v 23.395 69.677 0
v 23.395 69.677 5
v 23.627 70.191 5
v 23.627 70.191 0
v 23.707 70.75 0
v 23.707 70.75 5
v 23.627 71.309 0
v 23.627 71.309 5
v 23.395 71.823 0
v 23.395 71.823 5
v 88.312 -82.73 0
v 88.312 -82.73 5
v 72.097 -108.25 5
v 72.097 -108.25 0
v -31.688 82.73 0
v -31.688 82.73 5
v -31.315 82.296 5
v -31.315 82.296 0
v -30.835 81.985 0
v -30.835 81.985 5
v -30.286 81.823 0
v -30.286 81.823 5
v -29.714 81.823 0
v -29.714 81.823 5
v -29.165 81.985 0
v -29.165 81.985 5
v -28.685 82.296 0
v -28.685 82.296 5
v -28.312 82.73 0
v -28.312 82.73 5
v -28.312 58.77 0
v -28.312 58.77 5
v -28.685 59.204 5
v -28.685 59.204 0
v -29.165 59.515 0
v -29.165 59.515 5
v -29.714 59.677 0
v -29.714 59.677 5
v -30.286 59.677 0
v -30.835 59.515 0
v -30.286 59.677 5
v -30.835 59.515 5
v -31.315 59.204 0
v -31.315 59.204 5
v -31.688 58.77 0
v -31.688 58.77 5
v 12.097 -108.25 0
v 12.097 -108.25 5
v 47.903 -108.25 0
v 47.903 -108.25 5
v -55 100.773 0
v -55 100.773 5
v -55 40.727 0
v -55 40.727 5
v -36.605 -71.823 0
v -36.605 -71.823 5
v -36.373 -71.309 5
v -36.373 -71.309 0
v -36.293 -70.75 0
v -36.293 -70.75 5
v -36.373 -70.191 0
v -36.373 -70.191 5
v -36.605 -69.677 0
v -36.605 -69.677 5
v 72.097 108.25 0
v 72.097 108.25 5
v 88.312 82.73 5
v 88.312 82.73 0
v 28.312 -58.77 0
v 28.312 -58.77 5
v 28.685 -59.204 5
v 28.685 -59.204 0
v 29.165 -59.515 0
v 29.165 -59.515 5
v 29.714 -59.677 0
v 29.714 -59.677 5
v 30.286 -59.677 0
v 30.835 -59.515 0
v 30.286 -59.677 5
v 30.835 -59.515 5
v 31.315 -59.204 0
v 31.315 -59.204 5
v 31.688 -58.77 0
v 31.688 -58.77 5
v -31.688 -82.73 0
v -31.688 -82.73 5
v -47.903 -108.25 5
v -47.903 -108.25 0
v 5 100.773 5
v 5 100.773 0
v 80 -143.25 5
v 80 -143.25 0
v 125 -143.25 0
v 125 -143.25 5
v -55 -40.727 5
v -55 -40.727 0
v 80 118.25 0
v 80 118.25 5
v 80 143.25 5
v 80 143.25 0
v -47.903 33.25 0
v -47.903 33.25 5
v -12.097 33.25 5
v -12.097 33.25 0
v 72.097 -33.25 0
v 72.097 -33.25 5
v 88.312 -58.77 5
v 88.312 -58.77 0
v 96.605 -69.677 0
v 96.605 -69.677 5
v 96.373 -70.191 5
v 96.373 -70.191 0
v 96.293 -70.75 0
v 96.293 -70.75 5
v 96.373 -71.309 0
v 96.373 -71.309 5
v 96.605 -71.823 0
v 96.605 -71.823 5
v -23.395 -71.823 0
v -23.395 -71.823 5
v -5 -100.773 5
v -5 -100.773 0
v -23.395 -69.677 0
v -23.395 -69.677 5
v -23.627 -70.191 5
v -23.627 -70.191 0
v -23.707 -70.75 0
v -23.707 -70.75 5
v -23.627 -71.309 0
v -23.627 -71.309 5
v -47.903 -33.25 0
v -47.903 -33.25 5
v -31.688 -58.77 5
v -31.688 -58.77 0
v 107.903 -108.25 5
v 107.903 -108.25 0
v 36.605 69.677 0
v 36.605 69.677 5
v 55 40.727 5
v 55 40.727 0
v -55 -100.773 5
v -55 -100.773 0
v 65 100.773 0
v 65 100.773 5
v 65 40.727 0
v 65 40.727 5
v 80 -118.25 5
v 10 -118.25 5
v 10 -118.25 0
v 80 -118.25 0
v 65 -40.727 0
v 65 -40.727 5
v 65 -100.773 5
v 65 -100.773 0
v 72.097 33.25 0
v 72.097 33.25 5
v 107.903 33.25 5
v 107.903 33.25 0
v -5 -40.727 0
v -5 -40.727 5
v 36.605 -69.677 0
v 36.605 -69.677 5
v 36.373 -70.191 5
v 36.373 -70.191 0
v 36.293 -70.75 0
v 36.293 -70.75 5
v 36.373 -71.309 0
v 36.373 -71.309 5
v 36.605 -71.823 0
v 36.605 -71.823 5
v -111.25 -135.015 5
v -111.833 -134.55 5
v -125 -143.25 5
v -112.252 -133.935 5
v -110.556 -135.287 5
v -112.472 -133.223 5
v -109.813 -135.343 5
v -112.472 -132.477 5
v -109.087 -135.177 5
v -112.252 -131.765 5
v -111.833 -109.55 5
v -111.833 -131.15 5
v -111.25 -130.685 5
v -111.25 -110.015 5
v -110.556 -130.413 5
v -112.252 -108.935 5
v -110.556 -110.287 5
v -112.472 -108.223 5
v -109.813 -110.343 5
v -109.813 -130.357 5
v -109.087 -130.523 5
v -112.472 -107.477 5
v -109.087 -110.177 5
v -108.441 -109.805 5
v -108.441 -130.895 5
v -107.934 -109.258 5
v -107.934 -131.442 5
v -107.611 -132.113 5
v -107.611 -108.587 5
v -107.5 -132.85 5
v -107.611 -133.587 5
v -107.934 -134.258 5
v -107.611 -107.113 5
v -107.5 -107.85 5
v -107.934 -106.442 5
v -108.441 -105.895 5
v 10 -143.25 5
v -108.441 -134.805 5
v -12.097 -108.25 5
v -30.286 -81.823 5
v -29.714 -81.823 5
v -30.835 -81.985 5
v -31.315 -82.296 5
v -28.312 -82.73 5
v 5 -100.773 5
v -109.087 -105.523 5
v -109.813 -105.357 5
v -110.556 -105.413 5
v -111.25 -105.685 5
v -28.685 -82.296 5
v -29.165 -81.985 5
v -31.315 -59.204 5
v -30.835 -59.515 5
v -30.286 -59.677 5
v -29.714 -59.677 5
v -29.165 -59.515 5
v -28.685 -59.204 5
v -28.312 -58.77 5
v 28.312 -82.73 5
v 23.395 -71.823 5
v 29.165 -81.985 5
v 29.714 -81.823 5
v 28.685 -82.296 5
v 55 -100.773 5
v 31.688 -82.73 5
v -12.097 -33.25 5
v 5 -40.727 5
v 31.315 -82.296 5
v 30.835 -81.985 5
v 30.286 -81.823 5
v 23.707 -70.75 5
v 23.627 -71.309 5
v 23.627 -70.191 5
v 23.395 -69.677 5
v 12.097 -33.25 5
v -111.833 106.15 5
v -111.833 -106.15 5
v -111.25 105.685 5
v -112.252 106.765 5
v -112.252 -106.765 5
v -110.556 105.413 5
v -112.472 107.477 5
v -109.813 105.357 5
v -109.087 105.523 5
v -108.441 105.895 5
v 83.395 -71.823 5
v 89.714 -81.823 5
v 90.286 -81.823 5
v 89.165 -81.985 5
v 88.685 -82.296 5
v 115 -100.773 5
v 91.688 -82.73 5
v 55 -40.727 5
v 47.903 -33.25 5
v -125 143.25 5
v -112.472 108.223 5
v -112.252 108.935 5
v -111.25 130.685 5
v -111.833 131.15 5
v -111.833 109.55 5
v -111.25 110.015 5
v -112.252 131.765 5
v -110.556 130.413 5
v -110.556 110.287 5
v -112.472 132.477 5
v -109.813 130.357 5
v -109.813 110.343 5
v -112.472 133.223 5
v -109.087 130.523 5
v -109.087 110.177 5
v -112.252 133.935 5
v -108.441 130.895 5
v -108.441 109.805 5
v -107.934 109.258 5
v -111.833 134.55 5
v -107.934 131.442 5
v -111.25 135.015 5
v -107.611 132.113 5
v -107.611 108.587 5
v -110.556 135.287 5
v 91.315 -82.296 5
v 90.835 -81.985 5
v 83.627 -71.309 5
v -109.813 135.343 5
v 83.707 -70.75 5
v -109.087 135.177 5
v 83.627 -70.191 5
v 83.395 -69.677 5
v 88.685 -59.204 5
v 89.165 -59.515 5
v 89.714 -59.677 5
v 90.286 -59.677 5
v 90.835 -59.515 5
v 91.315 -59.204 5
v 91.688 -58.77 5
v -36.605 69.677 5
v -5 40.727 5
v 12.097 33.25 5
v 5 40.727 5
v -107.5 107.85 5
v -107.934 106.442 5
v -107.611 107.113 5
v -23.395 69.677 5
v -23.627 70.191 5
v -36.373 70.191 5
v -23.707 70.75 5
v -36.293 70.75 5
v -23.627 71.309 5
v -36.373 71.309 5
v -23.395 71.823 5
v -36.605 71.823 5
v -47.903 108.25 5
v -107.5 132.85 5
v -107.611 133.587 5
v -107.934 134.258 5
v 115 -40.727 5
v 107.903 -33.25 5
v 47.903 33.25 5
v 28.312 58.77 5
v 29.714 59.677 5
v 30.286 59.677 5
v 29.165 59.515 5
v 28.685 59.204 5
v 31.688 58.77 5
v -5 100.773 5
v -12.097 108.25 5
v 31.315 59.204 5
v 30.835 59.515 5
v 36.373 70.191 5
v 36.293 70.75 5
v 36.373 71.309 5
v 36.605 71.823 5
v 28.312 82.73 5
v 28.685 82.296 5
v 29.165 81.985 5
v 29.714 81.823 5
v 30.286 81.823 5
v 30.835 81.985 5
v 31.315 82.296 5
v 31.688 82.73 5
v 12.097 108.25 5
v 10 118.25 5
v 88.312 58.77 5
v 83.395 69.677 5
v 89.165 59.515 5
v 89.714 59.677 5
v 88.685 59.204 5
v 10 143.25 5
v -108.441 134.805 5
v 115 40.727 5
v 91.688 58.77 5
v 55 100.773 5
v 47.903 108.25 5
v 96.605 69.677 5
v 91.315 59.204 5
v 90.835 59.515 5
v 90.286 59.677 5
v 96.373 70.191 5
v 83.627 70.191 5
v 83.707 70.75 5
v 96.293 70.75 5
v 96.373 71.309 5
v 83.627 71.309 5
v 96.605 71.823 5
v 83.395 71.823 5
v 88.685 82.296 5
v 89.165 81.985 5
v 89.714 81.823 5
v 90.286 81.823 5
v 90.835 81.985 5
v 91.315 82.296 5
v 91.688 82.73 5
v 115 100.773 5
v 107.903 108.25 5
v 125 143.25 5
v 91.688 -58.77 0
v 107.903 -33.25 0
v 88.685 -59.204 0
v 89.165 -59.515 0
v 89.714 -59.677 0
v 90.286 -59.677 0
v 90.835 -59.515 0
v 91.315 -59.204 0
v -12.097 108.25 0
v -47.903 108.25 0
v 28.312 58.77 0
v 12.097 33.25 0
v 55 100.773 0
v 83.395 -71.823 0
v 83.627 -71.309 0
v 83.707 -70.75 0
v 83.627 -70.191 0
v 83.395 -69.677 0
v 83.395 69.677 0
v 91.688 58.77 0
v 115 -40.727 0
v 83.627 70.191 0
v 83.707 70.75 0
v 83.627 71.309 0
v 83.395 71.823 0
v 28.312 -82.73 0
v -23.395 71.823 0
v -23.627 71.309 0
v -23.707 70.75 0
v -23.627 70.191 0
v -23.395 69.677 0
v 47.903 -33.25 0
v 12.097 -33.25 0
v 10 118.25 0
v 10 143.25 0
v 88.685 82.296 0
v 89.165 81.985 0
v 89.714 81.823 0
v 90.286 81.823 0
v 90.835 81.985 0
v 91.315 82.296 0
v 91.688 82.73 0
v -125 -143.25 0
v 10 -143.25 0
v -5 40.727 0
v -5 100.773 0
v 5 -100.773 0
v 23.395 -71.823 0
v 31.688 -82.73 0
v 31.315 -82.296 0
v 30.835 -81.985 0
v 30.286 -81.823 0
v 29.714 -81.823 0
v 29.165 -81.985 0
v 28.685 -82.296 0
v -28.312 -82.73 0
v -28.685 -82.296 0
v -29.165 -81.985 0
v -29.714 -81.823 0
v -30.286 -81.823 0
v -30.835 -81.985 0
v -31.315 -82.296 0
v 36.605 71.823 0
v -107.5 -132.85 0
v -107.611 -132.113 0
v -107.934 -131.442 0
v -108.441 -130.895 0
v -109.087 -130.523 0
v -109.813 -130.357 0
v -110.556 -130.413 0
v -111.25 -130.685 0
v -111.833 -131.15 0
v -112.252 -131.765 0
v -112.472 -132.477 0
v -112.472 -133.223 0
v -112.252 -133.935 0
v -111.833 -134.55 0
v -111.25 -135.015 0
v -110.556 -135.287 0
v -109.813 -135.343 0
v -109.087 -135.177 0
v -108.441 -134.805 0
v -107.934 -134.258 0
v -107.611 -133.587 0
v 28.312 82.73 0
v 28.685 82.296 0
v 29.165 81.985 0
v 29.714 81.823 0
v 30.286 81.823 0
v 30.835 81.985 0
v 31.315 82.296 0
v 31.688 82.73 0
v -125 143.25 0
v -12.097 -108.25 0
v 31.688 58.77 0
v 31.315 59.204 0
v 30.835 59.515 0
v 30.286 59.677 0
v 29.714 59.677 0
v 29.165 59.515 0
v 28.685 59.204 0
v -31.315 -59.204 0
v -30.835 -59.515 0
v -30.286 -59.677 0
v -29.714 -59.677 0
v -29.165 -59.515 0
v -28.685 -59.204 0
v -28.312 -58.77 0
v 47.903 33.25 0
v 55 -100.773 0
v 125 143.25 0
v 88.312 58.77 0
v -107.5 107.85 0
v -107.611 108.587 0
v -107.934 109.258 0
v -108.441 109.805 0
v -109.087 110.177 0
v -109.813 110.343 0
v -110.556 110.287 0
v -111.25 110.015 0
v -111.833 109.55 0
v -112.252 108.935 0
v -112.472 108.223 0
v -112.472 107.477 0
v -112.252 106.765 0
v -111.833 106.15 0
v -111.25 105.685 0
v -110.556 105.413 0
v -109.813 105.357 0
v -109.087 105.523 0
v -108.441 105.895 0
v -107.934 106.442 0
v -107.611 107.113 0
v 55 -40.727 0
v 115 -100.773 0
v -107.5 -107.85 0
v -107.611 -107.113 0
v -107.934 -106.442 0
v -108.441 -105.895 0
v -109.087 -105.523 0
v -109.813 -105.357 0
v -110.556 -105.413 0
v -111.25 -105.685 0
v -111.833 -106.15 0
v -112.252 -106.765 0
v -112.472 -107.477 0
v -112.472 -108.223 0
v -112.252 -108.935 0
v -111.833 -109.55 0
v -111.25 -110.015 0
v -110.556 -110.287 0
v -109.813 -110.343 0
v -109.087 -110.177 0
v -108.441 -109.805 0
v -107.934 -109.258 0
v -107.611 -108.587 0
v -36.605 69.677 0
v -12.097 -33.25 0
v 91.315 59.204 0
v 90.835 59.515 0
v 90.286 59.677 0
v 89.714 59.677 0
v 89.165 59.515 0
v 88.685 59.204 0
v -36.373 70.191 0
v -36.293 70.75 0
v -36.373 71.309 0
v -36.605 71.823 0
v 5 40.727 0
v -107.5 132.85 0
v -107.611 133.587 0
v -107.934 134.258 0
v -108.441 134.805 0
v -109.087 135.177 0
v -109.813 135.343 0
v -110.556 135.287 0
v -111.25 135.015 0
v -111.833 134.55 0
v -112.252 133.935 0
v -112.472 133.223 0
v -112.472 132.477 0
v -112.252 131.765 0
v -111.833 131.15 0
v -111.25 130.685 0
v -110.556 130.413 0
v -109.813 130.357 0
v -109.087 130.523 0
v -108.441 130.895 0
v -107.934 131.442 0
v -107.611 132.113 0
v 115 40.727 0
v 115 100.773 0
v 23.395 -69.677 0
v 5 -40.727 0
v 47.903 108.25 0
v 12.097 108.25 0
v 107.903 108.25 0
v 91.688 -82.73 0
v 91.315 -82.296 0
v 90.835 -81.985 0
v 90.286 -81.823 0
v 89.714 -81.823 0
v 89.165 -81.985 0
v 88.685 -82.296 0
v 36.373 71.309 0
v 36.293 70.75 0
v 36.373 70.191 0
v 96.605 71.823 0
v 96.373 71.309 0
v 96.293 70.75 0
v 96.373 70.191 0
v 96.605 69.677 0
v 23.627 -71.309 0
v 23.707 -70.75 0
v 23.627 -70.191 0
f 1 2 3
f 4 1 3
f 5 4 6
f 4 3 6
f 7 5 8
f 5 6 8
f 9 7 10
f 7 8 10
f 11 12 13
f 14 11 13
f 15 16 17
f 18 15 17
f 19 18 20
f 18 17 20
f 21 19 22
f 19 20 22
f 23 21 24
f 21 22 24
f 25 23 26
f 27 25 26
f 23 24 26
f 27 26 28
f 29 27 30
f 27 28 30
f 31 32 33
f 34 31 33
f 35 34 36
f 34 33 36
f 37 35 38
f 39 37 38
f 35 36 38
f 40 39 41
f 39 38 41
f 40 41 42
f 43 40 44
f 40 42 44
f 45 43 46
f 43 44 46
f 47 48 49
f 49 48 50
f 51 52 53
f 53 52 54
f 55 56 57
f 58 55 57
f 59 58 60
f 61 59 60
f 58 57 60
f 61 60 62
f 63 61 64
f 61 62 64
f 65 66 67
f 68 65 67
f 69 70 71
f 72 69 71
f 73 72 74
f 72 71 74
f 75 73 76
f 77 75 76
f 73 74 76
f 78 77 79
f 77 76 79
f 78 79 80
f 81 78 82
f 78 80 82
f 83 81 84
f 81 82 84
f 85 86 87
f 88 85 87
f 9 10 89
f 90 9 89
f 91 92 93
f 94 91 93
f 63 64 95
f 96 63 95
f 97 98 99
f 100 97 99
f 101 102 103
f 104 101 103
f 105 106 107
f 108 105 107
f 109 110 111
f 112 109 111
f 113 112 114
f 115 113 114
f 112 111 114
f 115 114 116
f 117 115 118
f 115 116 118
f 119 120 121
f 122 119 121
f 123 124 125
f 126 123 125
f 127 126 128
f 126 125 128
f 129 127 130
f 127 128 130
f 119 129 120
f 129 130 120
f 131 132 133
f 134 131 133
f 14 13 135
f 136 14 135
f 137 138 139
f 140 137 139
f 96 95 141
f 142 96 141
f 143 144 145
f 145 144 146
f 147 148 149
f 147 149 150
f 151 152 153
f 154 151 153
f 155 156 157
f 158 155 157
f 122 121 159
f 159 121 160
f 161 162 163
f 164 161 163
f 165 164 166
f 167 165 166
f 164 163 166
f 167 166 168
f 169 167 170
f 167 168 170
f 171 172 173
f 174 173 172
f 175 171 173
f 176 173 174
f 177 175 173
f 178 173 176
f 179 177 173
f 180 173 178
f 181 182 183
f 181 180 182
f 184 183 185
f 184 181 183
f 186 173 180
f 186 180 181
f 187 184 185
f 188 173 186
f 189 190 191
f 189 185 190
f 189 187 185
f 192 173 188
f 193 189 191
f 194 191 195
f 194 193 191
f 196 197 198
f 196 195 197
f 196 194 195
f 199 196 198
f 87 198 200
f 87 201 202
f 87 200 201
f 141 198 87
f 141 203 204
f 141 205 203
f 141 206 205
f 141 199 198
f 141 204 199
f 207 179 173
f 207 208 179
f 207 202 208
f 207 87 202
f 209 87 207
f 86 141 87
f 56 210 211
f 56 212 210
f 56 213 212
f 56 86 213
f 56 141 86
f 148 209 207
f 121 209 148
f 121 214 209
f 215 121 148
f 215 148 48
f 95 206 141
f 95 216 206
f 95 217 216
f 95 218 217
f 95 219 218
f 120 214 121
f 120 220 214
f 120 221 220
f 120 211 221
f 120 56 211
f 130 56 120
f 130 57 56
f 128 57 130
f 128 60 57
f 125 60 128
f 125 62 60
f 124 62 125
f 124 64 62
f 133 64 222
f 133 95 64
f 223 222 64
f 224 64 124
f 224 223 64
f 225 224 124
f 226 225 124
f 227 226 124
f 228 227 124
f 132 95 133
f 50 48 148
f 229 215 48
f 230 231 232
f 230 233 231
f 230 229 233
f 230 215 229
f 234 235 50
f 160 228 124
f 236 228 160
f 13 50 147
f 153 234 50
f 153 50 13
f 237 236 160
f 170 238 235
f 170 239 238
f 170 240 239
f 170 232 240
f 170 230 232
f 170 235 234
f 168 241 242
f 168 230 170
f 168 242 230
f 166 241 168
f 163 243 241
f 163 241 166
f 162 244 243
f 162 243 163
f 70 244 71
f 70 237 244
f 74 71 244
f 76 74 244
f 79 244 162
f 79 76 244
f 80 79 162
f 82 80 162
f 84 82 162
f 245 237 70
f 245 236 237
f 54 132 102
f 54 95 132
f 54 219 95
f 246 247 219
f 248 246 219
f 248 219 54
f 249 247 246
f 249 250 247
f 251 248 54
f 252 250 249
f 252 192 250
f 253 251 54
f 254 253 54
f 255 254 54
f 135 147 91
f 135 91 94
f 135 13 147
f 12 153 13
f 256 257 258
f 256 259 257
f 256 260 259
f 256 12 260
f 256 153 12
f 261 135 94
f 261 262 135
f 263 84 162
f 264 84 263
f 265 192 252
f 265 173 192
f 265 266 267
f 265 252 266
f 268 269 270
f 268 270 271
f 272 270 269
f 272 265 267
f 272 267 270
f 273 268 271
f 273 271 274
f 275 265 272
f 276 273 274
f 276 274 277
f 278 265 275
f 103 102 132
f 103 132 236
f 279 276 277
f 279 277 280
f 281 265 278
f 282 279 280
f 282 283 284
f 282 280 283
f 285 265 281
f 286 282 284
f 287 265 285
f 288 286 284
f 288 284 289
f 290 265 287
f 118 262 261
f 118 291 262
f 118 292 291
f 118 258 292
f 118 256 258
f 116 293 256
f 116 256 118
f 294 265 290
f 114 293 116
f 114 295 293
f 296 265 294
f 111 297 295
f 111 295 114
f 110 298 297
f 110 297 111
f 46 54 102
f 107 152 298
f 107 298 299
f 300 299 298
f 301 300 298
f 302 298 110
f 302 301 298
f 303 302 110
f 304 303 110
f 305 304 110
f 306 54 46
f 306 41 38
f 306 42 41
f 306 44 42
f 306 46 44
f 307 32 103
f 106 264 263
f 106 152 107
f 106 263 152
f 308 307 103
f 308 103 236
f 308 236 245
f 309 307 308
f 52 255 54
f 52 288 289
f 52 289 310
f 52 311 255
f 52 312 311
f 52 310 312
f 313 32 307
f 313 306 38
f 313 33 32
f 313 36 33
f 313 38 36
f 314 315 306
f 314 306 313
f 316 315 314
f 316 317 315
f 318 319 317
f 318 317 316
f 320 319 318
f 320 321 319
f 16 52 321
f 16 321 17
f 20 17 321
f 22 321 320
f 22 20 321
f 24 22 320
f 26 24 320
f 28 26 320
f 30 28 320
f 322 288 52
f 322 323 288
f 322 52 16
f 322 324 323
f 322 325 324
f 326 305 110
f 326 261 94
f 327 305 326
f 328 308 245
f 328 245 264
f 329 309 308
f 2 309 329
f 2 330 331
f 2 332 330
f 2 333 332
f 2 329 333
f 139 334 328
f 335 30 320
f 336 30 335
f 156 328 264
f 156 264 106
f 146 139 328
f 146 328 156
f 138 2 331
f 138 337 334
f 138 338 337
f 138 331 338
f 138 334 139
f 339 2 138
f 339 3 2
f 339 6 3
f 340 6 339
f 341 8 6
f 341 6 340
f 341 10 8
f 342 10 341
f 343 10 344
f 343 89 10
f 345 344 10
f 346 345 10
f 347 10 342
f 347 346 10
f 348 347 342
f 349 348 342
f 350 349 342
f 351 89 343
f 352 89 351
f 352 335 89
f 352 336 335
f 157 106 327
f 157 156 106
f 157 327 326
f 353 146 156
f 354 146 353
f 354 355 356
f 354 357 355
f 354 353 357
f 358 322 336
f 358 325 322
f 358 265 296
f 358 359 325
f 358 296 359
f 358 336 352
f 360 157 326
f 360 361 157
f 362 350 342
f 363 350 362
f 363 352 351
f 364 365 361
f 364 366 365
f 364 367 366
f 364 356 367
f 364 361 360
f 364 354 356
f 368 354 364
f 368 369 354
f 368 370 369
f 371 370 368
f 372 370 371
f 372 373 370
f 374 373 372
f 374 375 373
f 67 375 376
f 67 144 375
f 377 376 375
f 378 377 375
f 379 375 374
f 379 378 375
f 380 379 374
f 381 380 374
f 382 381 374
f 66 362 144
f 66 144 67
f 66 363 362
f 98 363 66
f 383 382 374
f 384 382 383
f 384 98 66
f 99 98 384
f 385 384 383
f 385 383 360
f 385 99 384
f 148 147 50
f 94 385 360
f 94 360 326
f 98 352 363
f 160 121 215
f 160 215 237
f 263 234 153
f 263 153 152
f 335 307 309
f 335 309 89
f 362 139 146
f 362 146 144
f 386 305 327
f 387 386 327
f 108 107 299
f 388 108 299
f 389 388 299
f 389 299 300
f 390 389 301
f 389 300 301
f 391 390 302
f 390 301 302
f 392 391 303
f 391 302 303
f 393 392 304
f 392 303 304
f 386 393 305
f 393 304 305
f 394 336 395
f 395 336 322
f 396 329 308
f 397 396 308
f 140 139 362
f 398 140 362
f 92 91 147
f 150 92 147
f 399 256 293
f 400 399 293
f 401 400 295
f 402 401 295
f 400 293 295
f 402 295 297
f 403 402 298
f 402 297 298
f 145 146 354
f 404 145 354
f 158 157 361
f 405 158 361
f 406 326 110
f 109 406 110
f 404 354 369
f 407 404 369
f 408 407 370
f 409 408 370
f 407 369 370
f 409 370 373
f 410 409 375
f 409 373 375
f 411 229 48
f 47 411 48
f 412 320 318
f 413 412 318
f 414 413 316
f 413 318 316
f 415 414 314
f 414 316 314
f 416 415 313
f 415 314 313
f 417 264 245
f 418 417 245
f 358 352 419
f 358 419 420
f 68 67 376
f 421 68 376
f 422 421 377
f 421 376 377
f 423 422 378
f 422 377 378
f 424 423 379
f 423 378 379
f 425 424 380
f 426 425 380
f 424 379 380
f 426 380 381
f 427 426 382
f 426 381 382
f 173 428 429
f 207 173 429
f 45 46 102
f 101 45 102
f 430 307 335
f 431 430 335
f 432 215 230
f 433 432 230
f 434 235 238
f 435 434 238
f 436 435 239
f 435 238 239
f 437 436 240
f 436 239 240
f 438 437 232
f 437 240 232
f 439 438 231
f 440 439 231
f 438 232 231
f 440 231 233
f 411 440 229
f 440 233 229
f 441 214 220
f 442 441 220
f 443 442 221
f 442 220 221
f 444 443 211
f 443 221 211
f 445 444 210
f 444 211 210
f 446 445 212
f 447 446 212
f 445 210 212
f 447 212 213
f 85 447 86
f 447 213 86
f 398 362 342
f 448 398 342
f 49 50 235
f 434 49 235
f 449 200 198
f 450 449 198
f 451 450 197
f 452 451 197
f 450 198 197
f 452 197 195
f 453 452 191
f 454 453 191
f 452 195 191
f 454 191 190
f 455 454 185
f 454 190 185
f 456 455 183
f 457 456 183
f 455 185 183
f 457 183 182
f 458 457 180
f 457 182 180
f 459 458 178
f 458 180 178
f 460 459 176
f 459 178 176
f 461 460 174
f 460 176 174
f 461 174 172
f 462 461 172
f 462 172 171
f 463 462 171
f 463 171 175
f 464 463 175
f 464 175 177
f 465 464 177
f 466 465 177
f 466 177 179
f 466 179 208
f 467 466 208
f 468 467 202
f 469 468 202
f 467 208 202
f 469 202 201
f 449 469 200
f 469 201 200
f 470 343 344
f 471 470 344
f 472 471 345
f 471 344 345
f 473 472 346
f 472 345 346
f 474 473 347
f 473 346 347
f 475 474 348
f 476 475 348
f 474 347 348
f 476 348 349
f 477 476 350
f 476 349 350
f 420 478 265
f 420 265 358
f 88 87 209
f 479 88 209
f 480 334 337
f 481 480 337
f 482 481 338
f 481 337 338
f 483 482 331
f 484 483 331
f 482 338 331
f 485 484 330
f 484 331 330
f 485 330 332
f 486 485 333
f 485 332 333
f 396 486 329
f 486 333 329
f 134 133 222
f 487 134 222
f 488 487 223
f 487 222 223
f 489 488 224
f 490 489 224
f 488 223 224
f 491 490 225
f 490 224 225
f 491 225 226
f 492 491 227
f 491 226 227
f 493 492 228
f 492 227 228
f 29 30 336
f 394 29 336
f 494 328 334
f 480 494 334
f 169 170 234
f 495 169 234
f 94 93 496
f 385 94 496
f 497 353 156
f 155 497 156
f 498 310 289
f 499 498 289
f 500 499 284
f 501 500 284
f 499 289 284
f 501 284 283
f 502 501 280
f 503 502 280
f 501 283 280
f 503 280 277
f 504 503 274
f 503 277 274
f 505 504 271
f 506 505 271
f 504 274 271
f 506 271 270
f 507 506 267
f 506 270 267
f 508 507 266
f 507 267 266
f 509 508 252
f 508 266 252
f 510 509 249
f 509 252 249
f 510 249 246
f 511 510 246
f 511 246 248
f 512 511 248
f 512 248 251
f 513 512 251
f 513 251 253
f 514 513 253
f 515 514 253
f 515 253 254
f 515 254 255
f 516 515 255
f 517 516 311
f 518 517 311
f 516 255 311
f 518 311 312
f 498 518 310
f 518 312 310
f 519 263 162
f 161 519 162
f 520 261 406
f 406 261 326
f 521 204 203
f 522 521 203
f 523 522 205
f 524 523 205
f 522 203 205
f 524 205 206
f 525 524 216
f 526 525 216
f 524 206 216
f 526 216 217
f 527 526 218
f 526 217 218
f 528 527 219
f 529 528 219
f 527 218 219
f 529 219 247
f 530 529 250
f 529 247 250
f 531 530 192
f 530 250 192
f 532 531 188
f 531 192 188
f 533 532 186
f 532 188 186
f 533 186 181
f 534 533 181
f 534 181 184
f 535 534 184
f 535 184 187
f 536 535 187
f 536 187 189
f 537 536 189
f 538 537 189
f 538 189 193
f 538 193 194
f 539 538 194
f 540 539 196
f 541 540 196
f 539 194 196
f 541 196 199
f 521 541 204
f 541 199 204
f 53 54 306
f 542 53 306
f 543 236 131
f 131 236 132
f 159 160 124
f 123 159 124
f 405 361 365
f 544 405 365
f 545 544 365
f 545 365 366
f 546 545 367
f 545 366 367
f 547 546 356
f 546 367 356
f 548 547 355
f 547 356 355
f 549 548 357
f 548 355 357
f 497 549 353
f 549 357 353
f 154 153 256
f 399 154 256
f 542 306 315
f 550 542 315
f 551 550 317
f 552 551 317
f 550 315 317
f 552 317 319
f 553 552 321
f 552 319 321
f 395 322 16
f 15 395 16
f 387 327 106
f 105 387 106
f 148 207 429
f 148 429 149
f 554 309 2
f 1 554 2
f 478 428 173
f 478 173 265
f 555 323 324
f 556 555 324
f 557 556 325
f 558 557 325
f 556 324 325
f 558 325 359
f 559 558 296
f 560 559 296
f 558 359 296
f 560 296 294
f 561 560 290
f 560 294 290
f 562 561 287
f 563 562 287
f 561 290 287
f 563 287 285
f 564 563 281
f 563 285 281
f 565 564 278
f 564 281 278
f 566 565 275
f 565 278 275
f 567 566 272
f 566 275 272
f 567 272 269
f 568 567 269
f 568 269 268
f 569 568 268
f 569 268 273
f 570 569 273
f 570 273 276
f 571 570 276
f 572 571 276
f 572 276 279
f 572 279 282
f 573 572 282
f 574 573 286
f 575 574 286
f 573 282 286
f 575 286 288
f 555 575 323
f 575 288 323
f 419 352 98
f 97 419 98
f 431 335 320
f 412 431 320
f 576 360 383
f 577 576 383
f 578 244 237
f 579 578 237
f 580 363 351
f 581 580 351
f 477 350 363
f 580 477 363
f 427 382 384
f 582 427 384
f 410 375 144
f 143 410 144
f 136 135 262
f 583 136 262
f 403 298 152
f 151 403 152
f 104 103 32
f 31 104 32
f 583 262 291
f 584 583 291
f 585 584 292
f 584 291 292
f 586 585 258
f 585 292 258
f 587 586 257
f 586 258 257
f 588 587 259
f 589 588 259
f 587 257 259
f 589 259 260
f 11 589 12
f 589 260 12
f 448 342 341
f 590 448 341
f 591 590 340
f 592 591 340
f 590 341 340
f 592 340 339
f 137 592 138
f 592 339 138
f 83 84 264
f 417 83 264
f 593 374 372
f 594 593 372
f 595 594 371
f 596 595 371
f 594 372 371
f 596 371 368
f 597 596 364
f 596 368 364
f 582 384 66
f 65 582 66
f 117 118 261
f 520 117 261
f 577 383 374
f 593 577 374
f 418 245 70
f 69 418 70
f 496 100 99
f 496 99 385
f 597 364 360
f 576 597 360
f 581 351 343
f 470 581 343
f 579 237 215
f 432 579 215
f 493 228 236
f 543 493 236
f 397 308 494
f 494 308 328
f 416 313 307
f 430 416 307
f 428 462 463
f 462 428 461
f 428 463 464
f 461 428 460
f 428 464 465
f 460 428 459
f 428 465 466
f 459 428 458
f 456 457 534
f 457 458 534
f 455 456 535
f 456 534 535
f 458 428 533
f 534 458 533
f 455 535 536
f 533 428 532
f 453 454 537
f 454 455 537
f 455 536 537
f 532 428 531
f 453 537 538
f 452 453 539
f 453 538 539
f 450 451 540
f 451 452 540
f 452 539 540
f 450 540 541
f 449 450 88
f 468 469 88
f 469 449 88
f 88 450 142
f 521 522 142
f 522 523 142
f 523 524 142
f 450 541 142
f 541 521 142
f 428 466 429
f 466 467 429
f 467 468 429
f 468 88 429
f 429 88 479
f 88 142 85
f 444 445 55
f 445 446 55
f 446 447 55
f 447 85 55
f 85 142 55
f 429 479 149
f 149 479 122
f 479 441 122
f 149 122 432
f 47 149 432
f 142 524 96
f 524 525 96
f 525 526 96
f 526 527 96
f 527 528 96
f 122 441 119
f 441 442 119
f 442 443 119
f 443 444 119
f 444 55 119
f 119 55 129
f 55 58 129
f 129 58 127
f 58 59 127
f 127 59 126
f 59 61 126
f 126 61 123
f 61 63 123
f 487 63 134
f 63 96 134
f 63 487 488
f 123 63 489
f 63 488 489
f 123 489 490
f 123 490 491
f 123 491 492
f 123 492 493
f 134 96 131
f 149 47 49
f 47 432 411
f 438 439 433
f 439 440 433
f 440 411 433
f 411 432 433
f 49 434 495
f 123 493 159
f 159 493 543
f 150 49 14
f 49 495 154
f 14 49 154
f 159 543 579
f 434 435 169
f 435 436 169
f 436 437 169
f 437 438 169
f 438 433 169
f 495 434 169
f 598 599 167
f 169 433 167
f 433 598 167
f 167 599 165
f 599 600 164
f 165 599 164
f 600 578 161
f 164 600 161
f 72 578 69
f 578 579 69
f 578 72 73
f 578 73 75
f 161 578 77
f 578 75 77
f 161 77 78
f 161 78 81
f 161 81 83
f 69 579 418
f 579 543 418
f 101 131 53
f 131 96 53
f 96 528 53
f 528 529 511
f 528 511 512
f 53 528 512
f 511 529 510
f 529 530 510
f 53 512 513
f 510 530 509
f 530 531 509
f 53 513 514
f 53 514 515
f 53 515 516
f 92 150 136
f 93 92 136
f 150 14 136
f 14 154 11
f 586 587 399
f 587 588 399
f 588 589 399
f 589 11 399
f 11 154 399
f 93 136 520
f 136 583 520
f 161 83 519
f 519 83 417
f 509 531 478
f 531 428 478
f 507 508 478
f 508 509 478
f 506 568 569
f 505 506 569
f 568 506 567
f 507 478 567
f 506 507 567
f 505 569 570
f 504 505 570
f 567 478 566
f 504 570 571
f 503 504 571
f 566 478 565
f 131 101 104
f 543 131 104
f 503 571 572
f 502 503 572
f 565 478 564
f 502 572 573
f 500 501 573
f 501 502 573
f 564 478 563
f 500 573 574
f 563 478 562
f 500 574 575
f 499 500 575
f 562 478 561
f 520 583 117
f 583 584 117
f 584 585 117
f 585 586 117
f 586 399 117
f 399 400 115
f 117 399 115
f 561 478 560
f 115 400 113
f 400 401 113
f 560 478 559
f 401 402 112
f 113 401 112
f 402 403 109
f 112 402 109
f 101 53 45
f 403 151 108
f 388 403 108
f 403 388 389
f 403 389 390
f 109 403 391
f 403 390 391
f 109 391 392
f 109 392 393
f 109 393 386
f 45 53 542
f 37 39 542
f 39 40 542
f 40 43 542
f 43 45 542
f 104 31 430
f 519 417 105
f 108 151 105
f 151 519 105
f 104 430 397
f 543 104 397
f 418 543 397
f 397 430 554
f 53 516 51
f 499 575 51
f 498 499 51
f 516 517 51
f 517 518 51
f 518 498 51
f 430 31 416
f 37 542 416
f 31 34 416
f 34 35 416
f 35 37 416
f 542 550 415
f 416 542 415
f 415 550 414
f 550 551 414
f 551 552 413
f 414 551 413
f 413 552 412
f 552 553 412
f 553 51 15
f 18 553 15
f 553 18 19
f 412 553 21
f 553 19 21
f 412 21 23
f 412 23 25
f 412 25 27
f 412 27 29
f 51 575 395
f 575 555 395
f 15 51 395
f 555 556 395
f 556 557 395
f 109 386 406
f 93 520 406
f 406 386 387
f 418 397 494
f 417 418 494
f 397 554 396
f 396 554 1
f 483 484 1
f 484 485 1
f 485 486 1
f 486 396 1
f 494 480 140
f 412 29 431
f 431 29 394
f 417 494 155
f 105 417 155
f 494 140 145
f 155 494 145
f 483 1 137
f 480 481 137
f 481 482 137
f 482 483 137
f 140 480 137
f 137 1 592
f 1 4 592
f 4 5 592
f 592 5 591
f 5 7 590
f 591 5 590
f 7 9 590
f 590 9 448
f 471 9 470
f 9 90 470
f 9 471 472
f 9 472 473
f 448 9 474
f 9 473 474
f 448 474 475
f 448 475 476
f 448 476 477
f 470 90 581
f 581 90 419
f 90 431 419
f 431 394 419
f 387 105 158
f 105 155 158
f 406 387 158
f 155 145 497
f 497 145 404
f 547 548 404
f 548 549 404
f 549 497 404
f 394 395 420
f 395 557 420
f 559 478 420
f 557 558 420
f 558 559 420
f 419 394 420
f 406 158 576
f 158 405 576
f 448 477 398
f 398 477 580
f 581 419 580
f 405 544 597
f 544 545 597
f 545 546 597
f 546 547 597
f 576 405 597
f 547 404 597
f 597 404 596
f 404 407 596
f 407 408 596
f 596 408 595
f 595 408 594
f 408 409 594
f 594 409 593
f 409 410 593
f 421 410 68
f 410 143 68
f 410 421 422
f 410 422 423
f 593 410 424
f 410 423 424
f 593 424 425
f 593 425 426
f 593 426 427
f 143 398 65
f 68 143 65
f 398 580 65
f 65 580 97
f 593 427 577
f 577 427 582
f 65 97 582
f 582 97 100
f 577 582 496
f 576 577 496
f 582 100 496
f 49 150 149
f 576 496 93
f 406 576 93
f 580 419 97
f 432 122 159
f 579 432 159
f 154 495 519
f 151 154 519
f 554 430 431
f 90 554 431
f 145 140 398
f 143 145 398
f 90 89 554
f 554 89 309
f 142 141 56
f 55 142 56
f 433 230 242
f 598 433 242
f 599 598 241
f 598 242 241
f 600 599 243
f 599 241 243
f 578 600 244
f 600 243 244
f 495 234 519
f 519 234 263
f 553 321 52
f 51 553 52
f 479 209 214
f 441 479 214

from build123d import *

# Parameters (mm, degrees)
SKETCH2_W           = 250
SKETCH2_H           = 286.5
BOSS_EXTRUDE1_DEPTH = 5
SKETCH3_R           = 2.5
SKETCH3_W           = 70
SKETCH3_H           = 25
CUT_EXTRUDE1_DEPTH  = 5


with BuildPart() as part:
    # Sketch2 → Boss-Extrude1 (new body)
    with BuildSketch(Plane.XY):
        Rectangle(SKETCH2_W, SKETCH2_H)
    extrude(amount=BOSS_EXTRUDE1_DEPTH)

    # Sketch3 → Cut-Extrude1 (cut)
    with BuildSketch(Plane.XY.offset(5)):
        with Locations((-110, -132.85)):
            Circle(SKETCH3_R)
        with Locations((-110, -107.85)):
            Circle(SKETCH3_R)
        with Locations((-110, 132.85)):
            Circle(SKETCH3_R)
        with Locations((-110, 107.85)):
            Circle(SKETCH3_R)
        with Locations((45, -130.75)):
            Rectangle(SKETCH3_W, SKETCH3_H)
        with Locations((45, 130.75)):
            Rectangle(SKETCH3_W, SKETCH3_H)
        with BuildLine():
            Line((28.31193033, 58.769897179), (12.096931793, 33.25))
            Line((12.096931793, 33.25), (47.903068207, 33.25))
            Line((47.903068207, 33.25), (31.68806967, 58.769897179))
            ThreePointArc((31.68806967, 58.769897179), (30, 59.697320474), (28.31193033, 58.769897179))
        make_face()
        with BuildLine():
            Line((23.394573112, 71.822576705), (5, 100.772786809))
            Line((5, 100.772786809), (5, 40.727213191))
            Line((5, 40.727213191), (23.394573112, 69.677423295))
            ThreePointArc((23.394573112, 69.677423295), (23.706503442, 70.75), (23.394573112, 71.822576705))
        make_face()
        with BuildLine():
            Line((47.903068207, 108.25), (12.096931793, 108.25))
            Line((12.096931793, 108.25), (28.31193033, 82.730102821))
            ThreePointArc((28.31193033, 82.730102821), (30, 81.802679526), (31.68806967, 82.730102821))
            Line((31.68806967, 82.730102821), (47.903068207, 108.25))
        make_face()
        with BuildLine():
            Line((-12.096931793, 108.25), (-47.903068207, 108.25))
            Line((-47.903068207, 108.25), (-31.68806967, 82.730102821))
            ThreePointArc((-31.68806967, 82.730102821), (-30, 81.802679526), (-28.31193033, 82.730102821))
            Line((-28.31193033, 82.730102821), (-12.096931793, 108.25))
        make_face()
        with BuildLine():
            Line((-5, 40.727213191), (-5, 100.772786809))
            Line((-5, 100.772786809), (-23.394573112, 71.822576705))
            ThreePointArc((-23.394573112, 71.822576705), (-23.706503442, 70.75), (-23.394573112, 69.677423295))
            Line((-23.394573112, 69.677423295), (-5, 40.727213191))
        make_face()
        with BuildLine():
            Line((-36.605426888, 71.822576705), (-55, 100.772786809))
            Line((-55, 100.772786809), (-55, 40.727213191))
            Line((-55, 40.727213191), (-36.605426888, 69.677423295))
            ThreePointArc((-36.605426888, 69.677423295), (-36.293496558, 70.75), (-36.605426888, 71.822576705))
        make_face()
        with BuildLine():
            Line((-31.68806967, 58.769897179), (-47.903068207, 33.25))
            Line((-47.903068207, 33.25), (-12.096931793, 33.25))
            Line((-12.096931793, 33.25), (-28.31193033, 58.769897179))
            ThreePointArc((-28.31193033, 58.769897179), (-30, 59.697320474), (-31.68806967, 58.769897179))
        make_face()
        with BuildLine():
            Line((55, 40.727213191), (55, 100.772786809))
            Line((55, 100.772786809), (36.605426888, 71.822576705))
            ThreePointArc((36.605426888, 71.822576705), (36.293496558, 70.75), (36.605426888, 69.677423295))
            Line((36.605426888, 69.677423295), (55, 40.727213191))
        make_face()
        with BuildLine():
            Line((-12.096931793, -33.25), (-47.903068207, -33.25))
            Line((-47.903068207, -33.25), (-31.68806967, -58.769897179))
            ThreePointArc((-31.68806967, -58.769897179), (-30, -59.697320474), (-28.31193033, -58.769897179))
            Line((-28.31193033, -58.769897179), (-12.096931793, -33.25))
        make_face()
        with BuildLine():
            Line((-36.605426888, -69.677423295), (-55, -40.727213191))
            Line((-55, -40.727213191), (-55, -100.772786809))
            Line((-55, -100.772786809), (-36.605426888, -71.822576705))
            ThreePointArc((-36.605426888, -71.822576705), (-36.293496558, -70.75), (-36.605426888, -69.677423295))
        make_face()
        with BuildLine():
            Line((-31.68806967, -82.730102821), (-47.903068207, -108.25))
            Line((-47.903068207, -108.25), (-12.096931793, -108.25))
            Line((-12.096931793, -108.25), (-28.31193033, -82.730102821))
            ThreePointArc((-28.31193033, -82.730102821), (-30, -81.802679526), (-31.68806967, -82.730102821))
        make_face()
        with BuildLine():
            Line((-5, -100.772786809), (-5, -40.727213191))
            Line((-5, -40.727213191), (-23.394573112, -69.677423295))
            ThreePointArc((-23.394573112, -69.677423295), (-23.706503442, -70.75), (-23.394573112, -71.822576705))
            Line((-23.394573112, -71.822576705), (-5, -100.772786809))
        make_face()
        with BuildLine():
            Line((23.394573112, -69.677423295), (5, -40.727213191))
            Line((5, -40.727213191), (5, -100.772786809))
            Line((5, -100.772786809), (23.394573112, -71.822576705))
            ThreePointArc((23.394573112, -71.822576705), (23.706503442, -70.75), (23.394573112, -69.677423295))
        make_face()
        with BuildLine():
            Line((47.903068207, -33.25), (12.096931793, -33.25))
            Line((12.096931793, -33.25), (28.31193033, -58.769897179))
            ThreePointArc((28.31193033, -58.769897179), (30, -59.697320474), (31.68806967, -58.769897179))
            Line((31.68806967, -58.769897179), (47.903068207, -33.25))
        make_face()
        with BuildLine():
            Line((55, -100.772786809), (55, -40.727213191))
            Line((55, -40.727213191), (36.605426888, -69.677423295))
            ThreePointArc((36.605426888, -69.677423295), (36.293496558, -70.75), (36.605426888, -71.822576705))
            Line((36.605426888, -71.822576705), (55, -100.772786809))
        make_face()
        with BuildLine():
            Line((28.31193033, -82.730102821), (12.096931793, -108.25))
            Line((12.096931793, -108.25), (47.903068207, -108.25))
            Line((47.903068207, -108.25), (31.68806967, -82.730102821))
            ThreePointArc((31.68806967, -82.730102821), (30, -81.802679526), (28.31193033, -82.730102821))
        make_face()
        with BuildLine():
            Line((83.394573112, -69.677423295), (65, -40.727213191))
            Line((65, -40.727213191), (65, -100.772786809))
            Line((65, -100.772786809), (83.394573112, -71.822576705))
            ThreePointArc((83.394573112, -71.822576705), (83.706503442, -70.75), (83.394573112, -69.677423295))
        make_face()
        with BuildLine():
            Line((107.903068207, -33.25), (72.096931793, -33.25))
            Line((72.096931793, -33.25), (88.31193033, -58.769897179))
            ThreePointArc((88.31193033, -58.769897179), (90, -59.697320474), (91.68806967, -58.769897179))
            Line((91.68806967, -58.769897179), (107.903068207, -33.25))
        make_face()
        with BuildLine():
            Line((115, -100.772786809), (115, -40.727213191))
            Line((115, -40.727213191), (96.605426888, -69.677423295))
            ThreePointArc((96.605426888, -69.677423295), (96.293496558, -70.75), (96.605426888, -71.822576705))
            Line((96.605426888, -71.822576705), (115, -100.772786809))
        make_face()
        with BuildLine():
            Line((88.31193033, -82.730102821), (72.096931793, -108.25))
            Line((72.096931793, -108.25), (107.903068207, -108.25))
            Line((107.903068207, -108.25), (91.68806967, -82.730102821))
            ThreePointArc((91.68806967, -82.730102821), (90, -81.802679526), (88.31193033, -82.730102821))
        make_face()
        with BuildLine():
            Line((115, 40.727213191), (115, 100.772786809))
            Line((115, 100.772786809), (96.605426888, 71.822576705))
            ThreePointArc((96.605426888, 71.822576705), (96.293496558, 70.75), (96.605426888, 69.677423295))
            Line((96.605426888, 69.677423295), (115, 40.727213191))
        make_face()
        with BuildLine():
            Line((91.68806967, 82.730102821), (107.903068207, 108.25))
            Line((107.903068207, 108.25), (72.096931793, 108.25))
            Line((72.096931793, 108.25), (88.31193033, 82.730102821))
            ThreePointArc((88.31193033, 82.730102821), (90, 81.802679526), (91.68806967, 82.730102821))
        make_face()
        with BuildLine():
            Line((83.394573112, 71.822576705), (65, 100.772786809))
            Line((65, 100.772786809), (65, 40.727213191))
            Line((65, 40.727213191), (83.394573112, 69.677423295))
            ThreePointArc((83.394573112, 69.677423295), (83.706503442, 70.75), (83.394573112, 71.822576705))
        make_face()
        with BuildLine():
            Line((72.096931793, 33.25), (107.903068207, 33.25))
            Line((107.903068207, 33.25), (91.68806967, 58.769897179))
            ThreePointArc((91.68806967, 58.769897179), (90, 59.697320474), (88.31193033, 58.769897179))
            Line((88.31193033, 58.769897179), (72.096931793, 33.25))
        make_face()
    extrude(amount=-CUT_EXTRUDE1_DEPTH, mode=Mode.SUBTRACT)


solid = part.part
